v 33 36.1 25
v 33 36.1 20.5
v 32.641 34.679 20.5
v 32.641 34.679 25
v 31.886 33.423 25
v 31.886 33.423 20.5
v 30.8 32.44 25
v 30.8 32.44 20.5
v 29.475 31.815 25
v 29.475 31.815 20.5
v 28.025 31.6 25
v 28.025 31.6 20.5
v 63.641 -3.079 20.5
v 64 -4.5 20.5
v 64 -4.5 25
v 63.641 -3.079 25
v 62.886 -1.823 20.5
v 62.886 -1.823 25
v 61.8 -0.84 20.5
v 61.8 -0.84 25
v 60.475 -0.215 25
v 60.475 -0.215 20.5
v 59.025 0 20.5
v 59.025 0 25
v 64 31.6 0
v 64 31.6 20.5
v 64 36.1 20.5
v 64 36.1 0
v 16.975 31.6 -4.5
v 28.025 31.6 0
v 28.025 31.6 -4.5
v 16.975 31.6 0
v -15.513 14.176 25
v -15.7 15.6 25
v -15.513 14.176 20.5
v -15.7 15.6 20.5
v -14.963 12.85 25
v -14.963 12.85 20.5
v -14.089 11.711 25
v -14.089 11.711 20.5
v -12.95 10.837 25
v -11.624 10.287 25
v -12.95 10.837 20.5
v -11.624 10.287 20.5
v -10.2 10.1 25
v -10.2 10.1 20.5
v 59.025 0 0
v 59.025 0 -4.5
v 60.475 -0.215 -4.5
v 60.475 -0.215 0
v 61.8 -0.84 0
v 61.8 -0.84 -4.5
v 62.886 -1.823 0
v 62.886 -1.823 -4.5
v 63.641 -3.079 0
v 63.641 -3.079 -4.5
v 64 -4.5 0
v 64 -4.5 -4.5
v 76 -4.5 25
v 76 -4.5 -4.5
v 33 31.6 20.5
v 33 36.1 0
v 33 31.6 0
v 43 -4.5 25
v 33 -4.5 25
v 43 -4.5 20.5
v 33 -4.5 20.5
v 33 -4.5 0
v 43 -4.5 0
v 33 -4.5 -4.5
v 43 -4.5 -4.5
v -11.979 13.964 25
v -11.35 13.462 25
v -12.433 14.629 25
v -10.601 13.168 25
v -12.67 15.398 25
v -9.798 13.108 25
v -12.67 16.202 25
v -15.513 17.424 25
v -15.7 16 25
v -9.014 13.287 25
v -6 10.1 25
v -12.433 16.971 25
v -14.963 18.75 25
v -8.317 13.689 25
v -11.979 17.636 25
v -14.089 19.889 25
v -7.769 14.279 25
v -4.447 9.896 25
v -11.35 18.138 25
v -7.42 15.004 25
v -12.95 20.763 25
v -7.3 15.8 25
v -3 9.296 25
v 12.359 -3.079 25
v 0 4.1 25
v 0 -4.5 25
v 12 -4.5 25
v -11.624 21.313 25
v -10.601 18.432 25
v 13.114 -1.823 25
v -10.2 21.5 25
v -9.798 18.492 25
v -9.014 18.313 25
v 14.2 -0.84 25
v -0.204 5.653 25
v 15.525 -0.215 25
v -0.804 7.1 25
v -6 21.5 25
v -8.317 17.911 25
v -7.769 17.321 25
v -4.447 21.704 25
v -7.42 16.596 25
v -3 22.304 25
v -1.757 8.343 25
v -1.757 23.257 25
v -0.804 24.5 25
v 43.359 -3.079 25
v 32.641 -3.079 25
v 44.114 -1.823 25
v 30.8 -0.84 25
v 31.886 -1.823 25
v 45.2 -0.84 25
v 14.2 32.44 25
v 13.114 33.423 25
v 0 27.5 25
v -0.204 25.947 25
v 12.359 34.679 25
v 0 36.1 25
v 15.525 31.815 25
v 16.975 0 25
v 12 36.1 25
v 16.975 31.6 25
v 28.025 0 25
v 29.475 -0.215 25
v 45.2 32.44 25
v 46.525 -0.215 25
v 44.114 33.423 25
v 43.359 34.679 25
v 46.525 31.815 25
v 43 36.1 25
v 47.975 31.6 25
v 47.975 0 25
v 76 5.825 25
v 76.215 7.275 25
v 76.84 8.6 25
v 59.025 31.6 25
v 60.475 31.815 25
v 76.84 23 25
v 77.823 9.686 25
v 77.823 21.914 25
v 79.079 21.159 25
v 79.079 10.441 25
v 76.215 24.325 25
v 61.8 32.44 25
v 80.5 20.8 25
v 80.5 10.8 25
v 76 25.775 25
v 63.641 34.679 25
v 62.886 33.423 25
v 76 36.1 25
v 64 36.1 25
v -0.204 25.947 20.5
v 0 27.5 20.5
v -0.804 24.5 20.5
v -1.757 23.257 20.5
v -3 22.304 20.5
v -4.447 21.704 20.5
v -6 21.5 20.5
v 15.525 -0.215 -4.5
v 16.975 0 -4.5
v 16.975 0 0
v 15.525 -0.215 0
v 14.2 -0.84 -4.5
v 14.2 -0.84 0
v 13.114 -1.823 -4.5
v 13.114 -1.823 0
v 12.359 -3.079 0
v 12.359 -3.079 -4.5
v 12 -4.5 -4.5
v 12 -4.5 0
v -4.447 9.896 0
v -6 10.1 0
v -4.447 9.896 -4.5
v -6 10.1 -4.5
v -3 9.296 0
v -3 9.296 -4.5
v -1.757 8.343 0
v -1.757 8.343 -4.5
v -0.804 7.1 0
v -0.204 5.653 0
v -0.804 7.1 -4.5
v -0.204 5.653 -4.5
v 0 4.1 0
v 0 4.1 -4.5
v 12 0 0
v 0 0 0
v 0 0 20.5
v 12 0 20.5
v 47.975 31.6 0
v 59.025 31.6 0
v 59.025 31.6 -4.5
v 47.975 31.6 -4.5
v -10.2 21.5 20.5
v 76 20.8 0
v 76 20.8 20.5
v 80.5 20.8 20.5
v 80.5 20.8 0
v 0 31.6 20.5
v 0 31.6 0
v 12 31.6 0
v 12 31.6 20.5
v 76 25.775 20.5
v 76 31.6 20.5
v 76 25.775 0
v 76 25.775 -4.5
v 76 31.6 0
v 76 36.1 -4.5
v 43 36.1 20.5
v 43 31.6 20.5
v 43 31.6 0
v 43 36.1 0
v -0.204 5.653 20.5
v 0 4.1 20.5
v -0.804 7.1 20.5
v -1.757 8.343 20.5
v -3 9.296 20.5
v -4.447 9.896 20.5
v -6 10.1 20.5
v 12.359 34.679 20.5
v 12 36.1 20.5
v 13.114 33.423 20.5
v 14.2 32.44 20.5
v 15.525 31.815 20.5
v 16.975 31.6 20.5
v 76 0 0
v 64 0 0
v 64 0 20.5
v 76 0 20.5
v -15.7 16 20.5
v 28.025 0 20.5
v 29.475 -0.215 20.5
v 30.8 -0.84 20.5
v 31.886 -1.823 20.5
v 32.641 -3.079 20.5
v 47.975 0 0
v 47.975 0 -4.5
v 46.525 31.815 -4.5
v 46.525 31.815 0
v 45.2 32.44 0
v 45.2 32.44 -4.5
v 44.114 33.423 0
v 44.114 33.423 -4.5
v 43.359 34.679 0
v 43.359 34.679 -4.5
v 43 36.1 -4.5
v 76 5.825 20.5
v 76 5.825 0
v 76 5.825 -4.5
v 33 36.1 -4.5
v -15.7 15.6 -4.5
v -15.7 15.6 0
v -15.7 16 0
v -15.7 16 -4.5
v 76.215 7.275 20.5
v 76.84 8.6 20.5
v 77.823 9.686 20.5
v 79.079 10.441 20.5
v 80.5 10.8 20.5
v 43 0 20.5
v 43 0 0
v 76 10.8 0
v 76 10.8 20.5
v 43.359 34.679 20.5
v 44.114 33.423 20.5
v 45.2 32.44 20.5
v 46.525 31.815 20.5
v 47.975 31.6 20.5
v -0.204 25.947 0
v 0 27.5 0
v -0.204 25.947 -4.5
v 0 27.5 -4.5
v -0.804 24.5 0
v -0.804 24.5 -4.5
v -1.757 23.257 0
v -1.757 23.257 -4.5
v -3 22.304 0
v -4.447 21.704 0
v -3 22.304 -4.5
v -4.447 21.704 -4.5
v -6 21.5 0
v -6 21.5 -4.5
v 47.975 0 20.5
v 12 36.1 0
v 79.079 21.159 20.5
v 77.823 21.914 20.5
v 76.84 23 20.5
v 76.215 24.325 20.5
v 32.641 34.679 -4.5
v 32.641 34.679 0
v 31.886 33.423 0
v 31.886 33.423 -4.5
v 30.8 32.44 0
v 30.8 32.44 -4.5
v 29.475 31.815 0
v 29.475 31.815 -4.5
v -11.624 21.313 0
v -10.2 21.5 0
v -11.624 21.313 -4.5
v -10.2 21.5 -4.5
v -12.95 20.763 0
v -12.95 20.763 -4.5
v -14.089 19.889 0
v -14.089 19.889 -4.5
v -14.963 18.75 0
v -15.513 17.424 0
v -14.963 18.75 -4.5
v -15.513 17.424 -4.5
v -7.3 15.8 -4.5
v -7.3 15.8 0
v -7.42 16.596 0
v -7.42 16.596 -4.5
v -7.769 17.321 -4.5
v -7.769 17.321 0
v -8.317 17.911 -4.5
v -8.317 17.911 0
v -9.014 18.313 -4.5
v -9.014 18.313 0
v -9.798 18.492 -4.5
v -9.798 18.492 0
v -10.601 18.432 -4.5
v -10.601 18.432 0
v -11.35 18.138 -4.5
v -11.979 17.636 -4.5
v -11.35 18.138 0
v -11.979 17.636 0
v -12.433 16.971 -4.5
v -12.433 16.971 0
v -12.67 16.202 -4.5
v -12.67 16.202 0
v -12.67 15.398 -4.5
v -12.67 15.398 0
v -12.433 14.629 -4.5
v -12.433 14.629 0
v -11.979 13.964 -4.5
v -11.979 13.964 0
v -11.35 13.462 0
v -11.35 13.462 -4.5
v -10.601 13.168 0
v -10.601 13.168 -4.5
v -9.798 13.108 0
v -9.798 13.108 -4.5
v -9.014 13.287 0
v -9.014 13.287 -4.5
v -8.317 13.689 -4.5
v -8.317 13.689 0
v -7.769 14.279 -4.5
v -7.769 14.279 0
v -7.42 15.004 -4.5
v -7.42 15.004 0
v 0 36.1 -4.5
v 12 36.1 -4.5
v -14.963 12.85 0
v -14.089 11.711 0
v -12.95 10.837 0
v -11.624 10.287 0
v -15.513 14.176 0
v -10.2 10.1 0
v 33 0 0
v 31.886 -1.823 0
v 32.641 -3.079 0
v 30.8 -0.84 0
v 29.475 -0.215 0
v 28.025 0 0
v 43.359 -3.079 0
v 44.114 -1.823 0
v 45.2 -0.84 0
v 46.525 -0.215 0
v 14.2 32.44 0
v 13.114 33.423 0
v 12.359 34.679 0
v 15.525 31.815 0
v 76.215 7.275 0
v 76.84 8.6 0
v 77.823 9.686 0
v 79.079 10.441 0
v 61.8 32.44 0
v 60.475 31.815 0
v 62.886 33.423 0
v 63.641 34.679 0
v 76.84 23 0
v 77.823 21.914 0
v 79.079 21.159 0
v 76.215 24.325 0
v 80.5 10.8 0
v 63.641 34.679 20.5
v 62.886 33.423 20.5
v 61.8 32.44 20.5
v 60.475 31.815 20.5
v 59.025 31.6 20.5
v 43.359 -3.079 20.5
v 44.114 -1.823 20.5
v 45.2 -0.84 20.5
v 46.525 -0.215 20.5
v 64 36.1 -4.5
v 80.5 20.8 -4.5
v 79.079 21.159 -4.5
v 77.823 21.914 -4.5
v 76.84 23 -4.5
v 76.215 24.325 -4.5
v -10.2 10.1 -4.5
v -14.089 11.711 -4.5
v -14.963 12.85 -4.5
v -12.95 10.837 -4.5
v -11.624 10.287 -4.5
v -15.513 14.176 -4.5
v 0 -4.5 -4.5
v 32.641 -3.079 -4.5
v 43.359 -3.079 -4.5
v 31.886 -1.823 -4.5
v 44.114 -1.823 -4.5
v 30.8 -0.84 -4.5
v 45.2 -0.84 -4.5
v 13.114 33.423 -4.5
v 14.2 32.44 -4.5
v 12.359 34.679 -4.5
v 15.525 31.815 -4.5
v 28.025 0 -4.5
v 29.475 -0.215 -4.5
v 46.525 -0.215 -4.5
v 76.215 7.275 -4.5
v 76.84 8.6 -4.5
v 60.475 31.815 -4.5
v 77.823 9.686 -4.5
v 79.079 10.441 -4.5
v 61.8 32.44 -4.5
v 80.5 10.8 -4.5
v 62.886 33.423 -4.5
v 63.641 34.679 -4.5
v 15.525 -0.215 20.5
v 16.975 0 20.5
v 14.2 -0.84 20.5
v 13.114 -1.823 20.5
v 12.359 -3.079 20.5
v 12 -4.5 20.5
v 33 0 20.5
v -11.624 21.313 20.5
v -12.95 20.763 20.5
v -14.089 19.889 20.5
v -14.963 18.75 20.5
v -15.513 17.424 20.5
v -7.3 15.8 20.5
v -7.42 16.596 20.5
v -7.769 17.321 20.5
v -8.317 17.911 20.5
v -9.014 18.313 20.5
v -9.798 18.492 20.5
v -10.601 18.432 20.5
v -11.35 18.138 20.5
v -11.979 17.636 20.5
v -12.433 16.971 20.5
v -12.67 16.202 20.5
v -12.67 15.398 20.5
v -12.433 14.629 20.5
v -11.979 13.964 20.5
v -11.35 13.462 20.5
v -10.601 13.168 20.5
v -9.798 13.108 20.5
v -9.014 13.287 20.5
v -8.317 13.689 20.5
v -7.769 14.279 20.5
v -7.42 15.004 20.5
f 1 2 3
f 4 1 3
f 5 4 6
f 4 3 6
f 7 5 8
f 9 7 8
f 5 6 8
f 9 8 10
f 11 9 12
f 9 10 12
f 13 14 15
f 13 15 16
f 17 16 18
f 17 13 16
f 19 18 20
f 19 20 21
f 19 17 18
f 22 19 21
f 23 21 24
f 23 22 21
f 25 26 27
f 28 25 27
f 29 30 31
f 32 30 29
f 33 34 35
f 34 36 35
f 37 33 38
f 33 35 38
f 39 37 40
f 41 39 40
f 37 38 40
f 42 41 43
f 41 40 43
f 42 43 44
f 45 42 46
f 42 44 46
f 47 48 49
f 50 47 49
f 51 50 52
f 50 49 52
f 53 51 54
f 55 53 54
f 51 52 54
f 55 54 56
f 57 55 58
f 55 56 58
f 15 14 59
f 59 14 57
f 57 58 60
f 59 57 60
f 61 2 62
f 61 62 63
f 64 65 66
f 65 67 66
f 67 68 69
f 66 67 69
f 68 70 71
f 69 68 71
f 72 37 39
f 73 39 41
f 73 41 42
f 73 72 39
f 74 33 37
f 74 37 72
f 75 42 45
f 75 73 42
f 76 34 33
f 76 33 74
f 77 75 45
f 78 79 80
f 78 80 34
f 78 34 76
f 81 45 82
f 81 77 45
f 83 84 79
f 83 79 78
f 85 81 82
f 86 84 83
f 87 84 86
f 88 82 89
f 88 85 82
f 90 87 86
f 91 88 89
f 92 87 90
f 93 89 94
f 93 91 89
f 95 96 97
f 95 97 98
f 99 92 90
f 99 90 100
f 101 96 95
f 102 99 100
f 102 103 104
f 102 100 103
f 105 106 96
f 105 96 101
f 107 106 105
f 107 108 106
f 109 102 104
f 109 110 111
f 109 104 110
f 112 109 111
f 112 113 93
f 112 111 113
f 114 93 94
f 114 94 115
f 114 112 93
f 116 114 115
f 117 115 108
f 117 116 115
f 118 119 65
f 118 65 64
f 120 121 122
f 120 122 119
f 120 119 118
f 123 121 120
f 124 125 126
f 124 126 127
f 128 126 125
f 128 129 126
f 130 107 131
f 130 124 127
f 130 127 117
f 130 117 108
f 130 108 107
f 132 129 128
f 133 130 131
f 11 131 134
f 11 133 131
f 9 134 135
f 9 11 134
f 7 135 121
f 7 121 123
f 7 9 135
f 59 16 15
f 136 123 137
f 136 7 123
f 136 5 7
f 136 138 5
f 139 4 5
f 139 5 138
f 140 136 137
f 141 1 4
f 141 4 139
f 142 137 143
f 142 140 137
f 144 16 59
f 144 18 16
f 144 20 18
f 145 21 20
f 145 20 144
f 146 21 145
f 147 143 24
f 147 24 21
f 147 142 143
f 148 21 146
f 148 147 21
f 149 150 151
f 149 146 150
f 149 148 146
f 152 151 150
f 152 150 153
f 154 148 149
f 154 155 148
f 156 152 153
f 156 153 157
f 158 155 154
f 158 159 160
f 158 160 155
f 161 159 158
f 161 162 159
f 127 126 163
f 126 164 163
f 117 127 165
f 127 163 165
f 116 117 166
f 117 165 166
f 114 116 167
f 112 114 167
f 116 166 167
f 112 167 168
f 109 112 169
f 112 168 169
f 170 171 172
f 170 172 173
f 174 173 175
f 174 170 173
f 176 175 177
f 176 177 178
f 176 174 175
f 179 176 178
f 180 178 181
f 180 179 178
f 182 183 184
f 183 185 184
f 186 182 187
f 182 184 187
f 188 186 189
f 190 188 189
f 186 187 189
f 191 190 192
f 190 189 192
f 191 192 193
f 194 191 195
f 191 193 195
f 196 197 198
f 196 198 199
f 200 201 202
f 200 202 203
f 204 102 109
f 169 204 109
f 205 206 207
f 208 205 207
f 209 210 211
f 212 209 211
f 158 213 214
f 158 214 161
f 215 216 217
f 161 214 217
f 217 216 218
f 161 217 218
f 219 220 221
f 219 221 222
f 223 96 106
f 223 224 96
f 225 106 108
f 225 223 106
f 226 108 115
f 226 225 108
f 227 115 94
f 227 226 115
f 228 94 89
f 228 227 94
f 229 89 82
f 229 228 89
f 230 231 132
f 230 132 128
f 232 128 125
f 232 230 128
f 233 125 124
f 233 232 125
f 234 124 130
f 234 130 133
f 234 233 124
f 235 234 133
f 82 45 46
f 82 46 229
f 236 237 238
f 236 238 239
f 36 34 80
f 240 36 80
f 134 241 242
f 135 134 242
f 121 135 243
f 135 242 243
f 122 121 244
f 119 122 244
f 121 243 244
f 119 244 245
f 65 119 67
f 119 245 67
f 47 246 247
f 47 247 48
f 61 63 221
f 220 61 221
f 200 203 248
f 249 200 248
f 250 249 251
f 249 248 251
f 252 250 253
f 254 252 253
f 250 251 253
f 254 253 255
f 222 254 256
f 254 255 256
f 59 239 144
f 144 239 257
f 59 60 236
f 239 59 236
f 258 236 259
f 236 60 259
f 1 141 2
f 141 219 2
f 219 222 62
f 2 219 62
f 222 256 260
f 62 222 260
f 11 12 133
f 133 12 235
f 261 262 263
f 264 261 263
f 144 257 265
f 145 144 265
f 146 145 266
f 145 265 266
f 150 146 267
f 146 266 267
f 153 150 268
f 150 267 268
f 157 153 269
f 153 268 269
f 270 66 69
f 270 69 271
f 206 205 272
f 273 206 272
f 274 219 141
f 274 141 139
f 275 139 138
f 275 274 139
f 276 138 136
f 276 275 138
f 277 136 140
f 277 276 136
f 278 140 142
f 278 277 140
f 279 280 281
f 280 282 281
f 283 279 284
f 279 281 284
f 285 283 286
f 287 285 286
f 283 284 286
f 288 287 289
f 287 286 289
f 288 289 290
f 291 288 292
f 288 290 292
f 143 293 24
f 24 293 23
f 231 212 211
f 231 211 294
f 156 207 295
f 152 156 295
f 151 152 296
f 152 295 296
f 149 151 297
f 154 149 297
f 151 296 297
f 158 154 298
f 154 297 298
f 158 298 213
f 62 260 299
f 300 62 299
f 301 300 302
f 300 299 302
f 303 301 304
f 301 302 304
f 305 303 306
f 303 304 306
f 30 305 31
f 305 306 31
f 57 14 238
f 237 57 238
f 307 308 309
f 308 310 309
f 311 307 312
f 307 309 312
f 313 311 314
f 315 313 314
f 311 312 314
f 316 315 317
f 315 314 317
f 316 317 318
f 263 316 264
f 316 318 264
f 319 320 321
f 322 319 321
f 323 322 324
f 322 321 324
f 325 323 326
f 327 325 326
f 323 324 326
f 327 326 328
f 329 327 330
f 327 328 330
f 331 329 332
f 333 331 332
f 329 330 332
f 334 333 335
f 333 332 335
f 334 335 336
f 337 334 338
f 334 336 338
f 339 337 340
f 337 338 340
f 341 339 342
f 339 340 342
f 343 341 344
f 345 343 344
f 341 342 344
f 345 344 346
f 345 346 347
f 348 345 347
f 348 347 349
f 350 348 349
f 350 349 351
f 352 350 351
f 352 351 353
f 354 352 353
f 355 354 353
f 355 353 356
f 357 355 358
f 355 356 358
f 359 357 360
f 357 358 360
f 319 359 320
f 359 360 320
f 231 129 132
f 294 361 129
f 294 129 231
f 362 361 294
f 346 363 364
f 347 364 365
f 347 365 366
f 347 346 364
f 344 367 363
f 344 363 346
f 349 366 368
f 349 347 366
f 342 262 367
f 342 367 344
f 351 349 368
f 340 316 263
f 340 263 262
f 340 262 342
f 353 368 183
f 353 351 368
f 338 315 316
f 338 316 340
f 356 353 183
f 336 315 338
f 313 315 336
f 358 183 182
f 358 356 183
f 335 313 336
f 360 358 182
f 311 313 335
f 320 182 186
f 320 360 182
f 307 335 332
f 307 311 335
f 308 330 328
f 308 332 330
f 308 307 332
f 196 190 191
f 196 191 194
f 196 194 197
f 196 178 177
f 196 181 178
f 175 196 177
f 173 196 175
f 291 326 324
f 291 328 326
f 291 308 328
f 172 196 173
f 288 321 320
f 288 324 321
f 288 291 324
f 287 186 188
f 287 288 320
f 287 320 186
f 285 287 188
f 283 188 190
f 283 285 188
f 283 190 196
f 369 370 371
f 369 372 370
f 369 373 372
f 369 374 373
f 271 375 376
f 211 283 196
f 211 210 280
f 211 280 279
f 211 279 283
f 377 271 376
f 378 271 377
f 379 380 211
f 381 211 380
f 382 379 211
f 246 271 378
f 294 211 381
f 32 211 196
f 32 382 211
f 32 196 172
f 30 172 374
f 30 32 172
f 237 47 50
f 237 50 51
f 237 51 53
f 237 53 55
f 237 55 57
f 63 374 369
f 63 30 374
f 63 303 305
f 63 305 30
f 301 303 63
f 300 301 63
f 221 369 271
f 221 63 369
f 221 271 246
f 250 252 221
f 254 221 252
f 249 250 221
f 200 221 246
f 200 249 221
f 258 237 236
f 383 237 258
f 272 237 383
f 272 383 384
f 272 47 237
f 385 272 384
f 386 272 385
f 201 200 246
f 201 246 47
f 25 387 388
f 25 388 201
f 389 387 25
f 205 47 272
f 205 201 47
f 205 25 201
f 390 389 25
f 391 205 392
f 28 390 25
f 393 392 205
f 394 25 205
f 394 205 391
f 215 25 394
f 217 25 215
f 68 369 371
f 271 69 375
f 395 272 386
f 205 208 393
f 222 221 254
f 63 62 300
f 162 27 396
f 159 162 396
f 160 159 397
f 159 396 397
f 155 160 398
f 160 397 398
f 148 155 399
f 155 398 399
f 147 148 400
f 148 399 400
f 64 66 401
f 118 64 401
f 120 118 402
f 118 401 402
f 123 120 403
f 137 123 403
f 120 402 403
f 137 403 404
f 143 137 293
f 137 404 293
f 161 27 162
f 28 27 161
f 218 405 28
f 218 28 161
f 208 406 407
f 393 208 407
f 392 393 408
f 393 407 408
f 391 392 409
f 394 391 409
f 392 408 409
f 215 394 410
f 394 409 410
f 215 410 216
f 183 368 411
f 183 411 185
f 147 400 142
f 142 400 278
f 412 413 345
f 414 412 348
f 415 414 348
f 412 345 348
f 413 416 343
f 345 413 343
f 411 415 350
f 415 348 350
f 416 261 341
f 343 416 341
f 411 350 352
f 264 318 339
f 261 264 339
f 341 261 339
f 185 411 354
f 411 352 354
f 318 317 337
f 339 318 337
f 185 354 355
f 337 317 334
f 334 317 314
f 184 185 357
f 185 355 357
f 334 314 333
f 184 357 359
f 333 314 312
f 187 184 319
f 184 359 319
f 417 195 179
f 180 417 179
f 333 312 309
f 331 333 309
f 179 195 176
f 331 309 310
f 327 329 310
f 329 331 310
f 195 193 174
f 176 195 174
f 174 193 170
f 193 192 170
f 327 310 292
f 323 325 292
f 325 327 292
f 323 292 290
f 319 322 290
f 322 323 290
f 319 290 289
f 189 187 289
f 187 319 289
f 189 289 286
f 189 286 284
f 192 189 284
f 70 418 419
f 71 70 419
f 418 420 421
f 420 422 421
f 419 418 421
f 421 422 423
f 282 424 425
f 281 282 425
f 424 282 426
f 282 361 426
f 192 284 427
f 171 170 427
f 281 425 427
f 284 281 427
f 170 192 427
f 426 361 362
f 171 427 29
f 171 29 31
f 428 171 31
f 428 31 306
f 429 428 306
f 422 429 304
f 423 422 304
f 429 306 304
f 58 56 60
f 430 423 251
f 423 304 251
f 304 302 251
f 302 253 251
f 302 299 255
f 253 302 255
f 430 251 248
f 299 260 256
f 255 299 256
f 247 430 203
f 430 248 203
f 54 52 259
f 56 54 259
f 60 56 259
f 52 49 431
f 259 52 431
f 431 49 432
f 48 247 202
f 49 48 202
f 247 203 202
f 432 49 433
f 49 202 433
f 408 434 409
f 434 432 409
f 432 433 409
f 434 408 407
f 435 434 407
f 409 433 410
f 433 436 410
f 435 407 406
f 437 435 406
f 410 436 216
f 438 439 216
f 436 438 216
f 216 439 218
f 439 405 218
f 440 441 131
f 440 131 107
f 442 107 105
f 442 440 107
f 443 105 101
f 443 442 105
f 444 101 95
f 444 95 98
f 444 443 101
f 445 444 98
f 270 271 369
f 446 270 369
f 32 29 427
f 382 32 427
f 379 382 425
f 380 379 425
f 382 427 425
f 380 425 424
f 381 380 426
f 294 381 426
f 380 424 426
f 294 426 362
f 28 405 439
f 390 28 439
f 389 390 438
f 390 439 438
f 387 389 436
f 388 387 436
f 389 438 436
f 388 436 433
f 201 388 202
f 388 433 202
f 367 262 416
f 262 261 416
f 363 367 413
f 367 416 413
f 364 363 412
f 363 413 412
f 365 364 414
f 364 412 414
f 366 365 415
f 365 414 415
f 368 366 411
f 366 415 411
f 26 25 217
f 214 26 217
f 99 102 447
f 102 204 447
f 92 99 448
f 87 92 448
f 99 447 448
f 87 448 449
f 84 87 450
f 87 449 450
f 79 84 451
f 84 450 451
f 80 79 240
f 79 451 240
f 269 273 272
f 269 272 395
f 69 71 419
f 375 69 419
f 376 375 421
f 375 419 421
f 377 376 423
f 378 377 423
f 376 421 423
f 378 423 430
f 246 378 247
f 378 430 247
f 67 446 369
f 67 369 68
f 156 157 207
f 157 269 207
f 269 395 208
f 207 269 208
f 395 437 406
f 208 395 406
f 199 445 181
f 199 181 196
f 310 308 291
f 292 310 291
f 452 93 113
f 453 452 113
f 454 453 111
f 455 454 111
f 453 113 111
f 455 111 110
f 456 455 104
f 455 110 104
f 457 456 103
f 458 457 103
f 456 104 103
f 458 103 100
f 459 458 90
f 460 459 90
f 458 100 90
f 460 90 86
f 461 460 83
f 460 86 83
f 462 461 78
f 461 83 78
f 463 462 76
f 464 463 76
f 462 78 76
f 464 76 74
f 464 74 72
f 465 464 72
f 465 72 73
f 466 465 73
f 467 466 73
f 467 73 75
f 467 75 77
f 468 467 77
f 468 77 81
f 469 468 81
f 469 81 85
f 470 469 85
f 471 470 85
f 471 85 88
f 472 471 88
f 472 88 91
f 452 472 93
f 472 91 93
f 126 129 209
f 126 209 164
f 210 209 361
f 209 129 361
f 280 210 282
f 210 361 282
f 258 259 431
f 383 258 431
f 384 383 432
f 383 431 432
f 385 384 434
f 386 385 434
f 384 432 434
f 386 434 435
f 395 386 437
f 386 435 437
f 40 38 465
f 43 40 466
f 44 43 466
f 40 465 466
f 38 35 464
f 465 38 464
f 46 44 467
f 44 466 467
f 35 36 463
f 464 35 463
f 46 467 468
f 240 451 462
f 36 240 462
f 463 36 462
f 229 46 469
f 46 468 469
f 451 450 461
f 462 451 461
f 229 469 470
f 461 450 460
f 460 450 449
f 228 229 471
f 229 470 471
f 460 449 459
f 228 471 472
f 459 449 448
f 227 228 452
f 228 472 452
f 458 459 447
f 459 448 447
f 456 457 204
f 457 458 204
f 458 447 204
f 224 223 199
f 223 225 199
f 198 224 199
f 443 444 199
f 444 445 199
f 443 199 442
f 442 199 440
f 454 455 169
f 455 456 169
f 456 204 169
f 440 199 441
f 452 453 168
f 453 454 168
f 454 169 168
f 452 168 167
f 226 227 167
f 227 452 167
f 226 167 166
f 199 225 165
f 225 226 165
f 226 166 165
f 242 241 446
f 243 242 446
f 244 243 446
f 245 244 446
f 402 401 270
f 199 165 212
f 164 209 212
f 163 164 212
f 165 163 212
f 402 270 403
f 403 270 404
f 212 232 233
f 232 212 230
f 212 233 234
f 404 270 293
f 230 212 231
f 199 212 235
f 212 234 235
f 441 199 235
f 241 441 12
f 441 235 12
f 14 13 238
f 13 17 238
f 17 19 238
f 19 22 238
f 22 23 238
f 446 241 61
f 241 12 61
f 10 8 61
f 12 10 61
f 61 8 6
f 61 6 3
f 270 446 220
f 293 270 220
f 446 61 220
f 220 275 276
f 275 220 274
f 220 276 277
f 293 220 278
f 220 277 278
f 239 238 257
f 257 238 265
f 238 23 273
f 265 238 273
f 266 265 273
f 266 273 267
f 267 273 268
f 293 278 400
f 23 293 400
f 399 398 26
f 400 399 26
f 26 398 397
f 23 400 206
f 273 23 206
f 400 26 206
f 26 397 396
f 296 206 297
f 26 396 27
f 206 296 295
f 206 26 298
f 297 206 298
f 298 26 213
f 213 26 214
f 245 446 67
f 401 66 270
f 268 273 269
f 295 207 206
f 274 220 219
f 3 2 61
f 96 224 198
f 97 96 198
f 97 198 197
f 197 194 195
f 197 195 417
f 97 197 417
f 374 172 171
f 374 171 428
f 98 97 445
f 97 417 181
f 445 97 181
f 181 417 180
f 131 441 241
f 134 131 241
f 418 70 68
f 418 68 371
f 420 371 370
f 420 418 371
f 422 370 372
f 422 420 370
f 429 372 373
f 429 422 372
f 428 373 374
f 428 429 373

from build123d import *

# Parameters (mm, degrees)
F0_W        = 12
F0_H        = 4.5
F0_W_2      = 4.5
F0_H_2      = 5
F1_DEPTH    = 4.5
F2_DEPTH    = 20.5
F3_START    = 20.5
F3_DEPTH    = 4.5
F4_T1_DEPTH = 4.5
F4_T3_DEPTH = 4.5
F5_T1_DEPTH = 4.5
F5_T3_DEPTH = 4.5
F7_START    = -25
F6_W        = 15.7
F6_H        = 11.4
F6_R        = 2.7
F7_DEPTH    = 4.5
F8_DEPTH    = 4.5
F9_R        = 6
F10_R       = 5.5


# Not quite as in the source:
# - a fillet or chamfer that OpenCascade refuses, or shapes differently, is made with other operations: its cross-section is extruded or revolved along the edge and cut away or added


with BuildPart() as f1:
    # F0 (on Top) → F1 (new body)
    with BuildSketch(Plane.XY):
        Polygon((12, 31.6), (0, 31.6), (0, 0), (12, 0), (33, 0), (38, 0), (43, 0), (64, 0), (76, 0), (76, 10.8), (76, 15.8), (76, 20.8), (76, 31.6), (64, 31.6), (43, 31.6), (38, 31.6), (33, 31.6), align=None)
        with Locations((6, -2.25)):
            Rectangle(F0_W, F0_H)
        Polygon((38, 0), (33, 0), (33, -4.5), (43, -4.5), (43, 0), align=None)
        with Locations((70, -2.25)):
            Rectangle(F0_W, F0_H)
        with Locations((78.25, 13.3)):
            Rectangle(F0_W_2, F0_H_2)
        with Locations((78.25, 18.3)):
            Rectangle(F0_W_2, F0_H_2)
        with Locations((70, 33.85)):
            Rectangle(F0_W, F0_H)
        Polygon((33, 36.1), (33, 31.6), (38, 31.6), (43, 31.6), (43, 36.1), align=None)
        with Locations((6, 33.85)):
            Rectangle(F0_W, F0_H)
    extrude(amount=-F1_DEPTH)

    # F0 (on Top) → F2 (join)
    with BuildSketch(Plane.XY):
        with Locations((6, -2.25)):
            Rectangle(F0_W, F0_H)
        Polygon((38, 0), (33, 0), (33, -4.5), (43, -4.5), (43, 0), align=None)
        Polygon((33, 36.1), (33, 31.6), (38, 31.6), (43, 31.6), (43, 36.1), align=None)
        with Locations((6, 33.85)):
            Rectangle(F0_W, F0_H)
        with Locations((70, -2.25)):
            Rectangle(F0_W, F0_H)
        with Locations((78.25, 13.3)):
            Rectangle(F0_W_2, F0_H_2)
        with Locations((78.25, 18.3)):
            Rectangle(F0_W_2, F0_H_2)
        with Locations((70, 33.85)):
            Rectangle(F0_W, F0_H)
    extrude(amount=F2_DEPTH)

    # F0 (on Top) → F3 (join)
    with BuildSketch(Plane.XY.offset(F3_START)):
        with Locations((6, 33.85)):
            Rectangle(F0_W, F0_H)
        Polygon((12, 31.6), (0, 31.6), (0, 0), (12, 0), (33, 0), (38, 0), (43, 0), (64, 0), (76, 0), (76, 10.8), (76, 15.8), (76, 20.8), (76, 31.6), (64, 31.6), (43, 31.6), (38, 31.6), (33, 31.6), align=None)
        with Locations((6, -2.25)):
            Rectangle(F0_W, F0_H)
        Polygon((33, 36.1), (33, 31.6), (38, 31.6), (43, 31.6), (43, 36.1), align=None)
        Polygon((38, 0), (33, 0), (33, -4.5), (43, -4.5), (43, 0), align=None)
        with Locations((70, 33.85)):
            Rectangle(F0_W, F0_H)
        with Locations((70, -2.25)):
            Rectangle(F0_W, F0_H)
        with Locations((78.25, 18.3)):
            Rectangle(F0_W_2, F0_H_2)
        with Locations((78.25, 13.3)):
            Rectangle(F0_W_2, F0_H_2)
    extrude(amount=F3_DEPTH)

    # F4: fillet of radius 5 on 18 edges, made by hand

    # F4_s2 → F4_t1 (join)
    with BuildSketch(Plane.XY.offset(20.5)):
        with BuildLine():
            ThreePointArc((16.9749371855, 0), (13.6208352193, -1.2919007565), (12, -4.5))
            Line((12, -4.5), (12, 0))
            Line((12, 0), (16.9749371855, 0))
        make_face()
        with BuildLine():
            ThreePointArc((28.0250628145, 0), (31.3791647807, -1.2919007565), (33, -4.5))
            Line((33, -4.5), (33, 0))
            Line((33, 0), (28.0250628145, 0))
        make_face()
        with BuildLine():
            ThreePointArc((43, -4.5), (44.6208352193, -1.2919007565), (47.9749371855, 0))
            Line((47.9749371855, 0), (43, 0))
            Line((43, 0), (43, -4.5))
        make_face()
        with BuildLine():
            ThreePointArc((64, -4.5), (62.3791647807, -1.2919007565), (59.0250628145, 0))
            Line((59.0250628145, 0), (64, 0))
            Line((64, 0), (64, -4.5))
        make_face()
        with BuildLine():
            ThreePointArc((76, 5.8250628145), (77.2919007565, 9.1791647807), (80.5, 10.8))
            Line((80.5, 10.8), (76, 10.8))
            Line((76, 10.8), (76, 5.8250628145))
        make_face()
        with BuildLine():
            ThreePointArc((80.5, 20.8), (77.2919007565, 22.4208352193), (76, 25.7749371855))
            Line((76, 25.7749371855), (76, 20.8))
            Line((76, 20.8), (80.5, 20.8))
        make_face()
        with BuildLine():
            ThreePointArc((43, 36.1), (44.6208352193, 32.8919007565), (47.9749371855, 31.6))
            Line((47.9749371855, 31.6), (43, 31.6))
            Line((43, 31.6), (43, 36.1))
        make_face()
        with BuildLine():
            ThreePointArc((12, 36.1), (13.6208352193, 32.8919007565), (16.9749371855, 31.6))
            Line((16.9749371855, 31.6), (12, 31.6))
            Line((12, 31.6), (12, 36.1))
        make_face()
        with BuildLine():
            ThreePointArc((64, 36.1), (62.3791647807, 32.8919007565), (59.0250628145, 31.6))
            Line((59.0250628145, 31.6), (64, 31.6))
            Line((64, 31.6), (64, 36.1))
        make_face()
    extrude(amount=F4_T1_DEPTH)

    # F4_s4 → F4_t3 (join)
    with BuildSketch(Plane.XY.offset(-4.5)):
        with BuildLine():
            ThreePointArc((16.9749371855, 0), (13.6208352193, -1.2919007565), (12, -4.5))
            Line((12, -4.5), (12, 0))
            Line((12, 0), (16.9749371855, 0))
        make_face()
        with BuildLine():
            ThreePointArc((33, -4.5), (31.3791647807, -1.2919007565), (28.0250628145, 0))
            Line((28.0250628145, 0), (33, 0))
            Line((33, 0), (33, -4.5))
        make_face()
        with BuildLine():
            ThreePointArc((43, -4.5), (44.6208352193, -1.2919007565), (47.9749371855, 0))
            Line((47.9749371855, 0), (43, 0))
            Line((43, 0), (43, -4.5))
        make_face()
        with BuildLine():
            ThreePointArc((59.0250628145, 0), (62.3791647807, -1.2919007565), (64, -4.5))
            Line((64, -4.5), (64, 0))
            Line((64, 0), (59.0250628145, 0))
        make_face()
        with BuildLine():
            ThreePointArc((76, 5.8250628145), (77.2919007565, 9.1791647807), (80.5, 10.8))
            Line((80.5, 10.8), (76, 10.8))
            Line((76, 10.8), (76, 5.8250628145))
        make_face()
        with BuildLine():
            ThreePointArc((80.5, 20.8), (77.2919007565, 22.4208352193), (76, 25.7749371855))
            Line((76, 25.7749371855), (76, 20.8))
            Line((76, 20.8), (80.5, 20.8))
        make_face()
        with BuildLine():
            ThreePointArc((47.9749371855, 31.6), (44.6208352193, 32.8919007565), (43, 36.1))
            Line((43, 36.1), (43, 31.6))
            Line((43, 31.6), (47.9749371855, 31.6))
        make_face()
        with BuildLine():
            ThreePointArc((16.9749371855, 31.6), (13.6208352193, 32.8919007565), (12, 36.1))
            Line((12, 36.1), (12, 31.6))
            Line((12, 31.6), (16.9749371855, 31.6))
        make_face()
        with BuildLine():
            ThreePointArc((64, 36.1), (62.3791647807, 32.8919007565), (59.0250628145, 31.6))
            Line((59.0250628145, 31.6), (64, 31.6))
            Line((64, 31.6), (64, 36.1))
        make_face()
    extrude(amount=F4_T3_DEPTH)

    # F5: fillet of radius 5 on 2 edges, made by hand

    # F5_s2 → F5_t1 (join)
    with BuildSketch(Plane.XY.offset(20.5)):
        with BuildLine():
            ThreePointArc((33, 36.1), (31.3791647807, 32.8919007565), (28.0250628145, 31.6))
            Line((28.0250628145, 31.6), (33, 31.6))
            Line((33, 31.6), (33, 36.1))
        make_face()
    extrude(amount=F5_T1_DEPTH)

    # F5_s4 → F5_t3 (join)
    with BuildSketch(Plane.XY.offset(-4.5)):
        with BuildLine():
            ThreePointArc((33, 36.1), (31.3791647807, 32.8919007565), (28.0250628145, 31.6))
            Line((28.0250628145, 31.6), (33, 31.6))
            Line((33, 31.6), (33, 36.1))
        make_face()
    extrude(amount=F5_T3_DEPTH)

    # F6 (on face) → F7 (join)
    with BuildSketch(Plane.XY.offset(25).offset(F7_START)):
        with Locations((-7.85, 15.8)):
            Rectangle(F6_W, F6_H)
        with Locations((-10, 15.8)):
            Circle(F6_R, mode=Mode.SUBTRACT)
    extrude(amount=-F7_DEPTH)

    # F6 (on face) → F8 (join)
    with BuildSketch(Plane.XY.offset(25)):
        with Locations((-7.85, 15.8)):
            Rectangle(F6_W, F6_H)
        with Locations((-10, 15.8)):
            Circle(F6_R, mode=Mode.SUBTRACT)
    extrude(amount=-F8_DEPTH)

    # F9
    f9_edges = [f1.edges().sort_by_distance(p)[0] for p in [
        (0, 21.5, 22.75),
        (0, 10.1, 22.75),
        (0, 10.1, -2.25),
        (0, 21.5, -2.25),
    ]]
    fillet(f9_edges, radius=F9_R)

    # F10
    f10_edges = [f1.edges().sort_by_distance(p)[0] for p in [
        (-15.7, 21.5, 22.75),
        (-15.7, 10.1, 22.75),
        (-15.7, 10.1, -2.25),
        (-15.7, 21.5, -2.25),
    ]]
    fillet(f10_edges, radius=F10_R)


solid = f1.part
